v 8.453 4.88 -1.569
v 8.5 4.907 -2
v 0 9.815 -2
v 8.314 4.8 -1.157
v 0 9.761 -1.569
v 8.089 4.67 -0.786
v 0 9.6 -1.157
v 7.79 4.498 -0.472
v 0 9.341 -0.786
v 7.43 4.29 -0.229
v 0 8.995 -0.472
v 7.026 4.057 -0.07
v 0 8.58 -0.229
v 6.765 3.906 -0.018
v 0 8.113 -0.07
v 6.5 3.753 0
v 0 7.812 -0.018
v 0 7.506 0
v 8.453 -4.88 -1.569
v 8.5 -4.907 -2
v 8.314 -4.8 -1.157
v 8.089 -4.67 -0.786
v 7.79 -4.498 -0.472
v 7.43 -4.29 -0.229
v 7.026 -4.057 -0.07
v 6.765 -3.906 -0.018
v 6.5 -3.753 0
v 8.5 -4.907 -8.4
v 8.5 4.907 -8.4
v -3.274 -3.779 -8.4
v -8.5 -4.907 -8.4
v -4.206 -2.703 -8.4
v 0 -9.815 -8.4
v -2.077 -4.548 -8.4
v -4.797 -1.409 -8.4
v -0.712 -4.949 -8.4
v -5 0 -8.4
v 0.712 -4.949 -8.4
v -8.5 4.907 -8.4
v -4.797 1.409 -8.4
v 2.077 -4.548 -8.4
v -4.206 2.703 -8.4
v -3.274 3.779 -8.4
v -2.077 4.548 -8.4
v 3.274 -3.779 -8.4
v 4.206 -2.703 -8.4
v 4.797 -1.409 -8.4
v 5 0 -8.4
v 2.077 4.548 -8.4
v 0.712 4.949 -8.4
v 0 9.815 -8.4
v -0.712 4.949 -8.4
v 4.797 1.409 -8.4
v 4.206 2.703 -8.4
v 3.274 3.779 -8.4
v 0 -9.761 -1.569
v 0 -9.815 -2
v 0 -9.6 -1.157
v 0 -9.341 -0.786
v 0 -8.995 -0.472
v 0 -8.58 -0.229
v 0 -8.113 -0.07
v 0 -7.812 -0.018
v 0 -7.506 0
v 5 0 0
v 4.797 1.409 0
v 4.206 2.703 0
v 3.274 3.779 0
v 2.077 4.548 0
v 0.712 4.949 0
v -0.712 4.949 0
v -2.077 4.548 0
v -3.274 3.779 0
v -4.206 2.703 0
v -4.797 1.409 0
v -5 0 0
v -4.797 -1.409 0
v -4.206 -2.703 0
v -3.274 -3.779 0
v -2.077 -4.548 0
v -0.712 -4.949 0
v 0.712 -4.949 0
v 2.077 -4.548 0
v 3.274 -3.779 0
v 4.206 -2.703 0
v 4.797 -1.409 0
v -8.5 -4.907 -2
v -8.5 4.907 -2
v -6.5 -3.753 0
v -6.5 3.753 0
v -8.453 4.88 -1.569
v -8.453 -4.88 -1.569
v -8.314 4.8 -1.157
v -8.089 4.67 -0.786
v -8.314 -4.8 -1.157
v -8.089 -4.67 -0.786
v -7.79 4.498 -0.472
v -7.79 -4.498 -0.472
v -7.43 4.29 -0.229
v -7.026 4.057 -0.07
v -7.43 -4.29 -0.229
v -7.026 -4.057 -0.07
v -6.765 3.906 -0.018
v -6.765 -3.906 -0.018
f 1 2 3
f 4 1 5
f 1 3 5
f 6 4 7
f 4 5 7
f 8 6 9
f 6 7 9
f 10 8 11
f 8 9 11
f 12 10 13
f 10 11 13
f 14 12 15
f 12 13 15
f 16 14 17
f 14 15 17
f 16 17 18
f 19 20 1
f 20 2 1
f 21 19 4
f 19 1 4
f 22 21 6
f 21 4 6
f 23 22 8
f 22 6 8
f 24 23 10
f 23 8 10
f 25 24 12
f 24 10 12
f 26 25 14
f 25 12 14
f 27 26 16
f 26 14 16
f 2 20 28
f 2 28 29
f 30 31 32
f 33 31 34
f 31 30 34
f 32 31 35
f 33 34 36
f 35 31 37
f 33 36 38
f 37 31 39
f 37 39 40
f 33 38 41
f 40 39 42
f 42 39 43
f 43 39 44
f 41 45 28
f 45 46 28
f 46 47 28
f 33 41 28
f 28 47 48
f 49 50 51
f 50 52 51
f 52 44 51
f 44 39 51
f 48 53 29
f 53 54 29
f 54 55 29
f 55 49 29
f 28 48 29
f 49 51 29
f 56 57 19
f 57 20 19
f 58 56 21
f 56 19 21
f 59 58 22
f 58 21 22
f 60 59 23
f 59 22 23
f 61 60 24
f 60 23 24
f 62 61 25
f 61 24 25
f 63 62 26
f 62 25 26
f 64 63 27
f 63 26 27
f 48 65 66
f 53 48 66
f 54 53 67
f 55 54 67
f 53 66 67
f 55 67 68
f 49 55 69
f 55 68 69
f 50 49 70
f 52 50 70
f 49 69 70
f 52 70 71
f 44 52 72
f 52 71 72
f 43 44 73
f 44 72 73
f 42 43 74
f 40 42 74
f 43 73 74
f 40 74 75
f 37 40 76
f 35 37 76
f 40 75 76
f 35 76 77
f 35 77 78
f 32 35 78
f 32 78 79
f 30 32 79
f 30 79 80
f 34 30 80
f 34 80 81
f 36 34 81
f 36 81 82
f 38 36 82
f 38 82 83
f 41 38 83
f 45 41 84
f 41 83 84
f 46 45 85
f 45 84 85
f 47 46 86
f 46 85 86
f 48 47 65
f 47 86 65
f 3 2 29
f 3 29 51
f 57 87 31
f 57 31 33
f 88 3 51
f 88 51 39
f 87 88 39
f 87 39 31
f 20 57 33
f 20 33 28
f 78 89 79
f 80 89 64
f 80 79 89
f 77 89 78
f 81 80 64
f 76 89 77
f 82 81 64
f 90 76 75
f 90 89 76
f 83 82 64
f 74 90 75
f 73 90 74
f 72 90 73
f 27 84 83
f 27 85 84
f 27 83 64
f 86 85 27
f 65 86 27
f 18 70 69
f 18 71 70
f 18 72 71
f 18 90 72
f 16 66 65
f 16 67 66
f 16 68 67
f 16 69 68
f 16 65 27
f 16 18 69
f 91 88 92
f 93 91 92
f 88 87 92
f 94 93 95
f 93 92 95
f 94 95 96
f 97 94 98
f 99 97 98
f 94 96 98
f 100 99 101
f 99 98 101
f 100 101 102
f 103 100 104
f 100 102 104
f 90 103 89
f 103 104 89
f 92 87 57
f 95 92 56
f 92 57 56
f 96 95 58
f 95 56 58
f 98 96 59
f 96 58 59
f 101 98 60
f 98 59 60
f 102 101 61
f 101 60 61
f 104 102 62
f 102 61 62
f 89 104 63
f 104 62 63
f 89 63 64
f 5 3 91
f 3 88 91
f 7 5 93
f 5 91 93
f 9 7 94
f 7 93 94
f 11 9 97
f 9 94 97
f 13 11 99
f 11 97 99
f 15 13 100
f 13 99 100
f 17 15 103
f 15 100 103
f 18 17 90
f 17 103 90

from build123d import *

# Parameters (mm, degrees)
ESQUISSE1_R        = 5
BOSS_EXTRU_1_DEPTH = 8.4
CONG_2_R           = 2


with BuildPart() as part:
    # Esquisse1 → Boss.-Extru.1 (new body)
    with BuildSketch(Plane.XY):
        Polygon((8.5, 4.907477288), (0, 9.814954576), (-8.5, 4.907477288), (-8.5, -4.907477288), (0, -9.814954576), (8.5, -4.907477288), align=None)
        Circle(ESQUISSE1_R, mode=Mode.SUBTRACT)
    extrude(amount=-BOSS_EXTRU_1_DEPTH)

    # Congé2
    cong_2_edges = [part.edges().sort_by_distance(p)[0] for p in [
        (4.25, -7.361215932, 0),
        (-4.25, -7.361215932, 0),
        (-8.5, 0, 0),
        (-4.25, 7.361215932, 0),
        (4.25, 7.361215932, 0),
        (8.5, 0, 0),
    ]]
    fillet(cong_2_edges, radius=CONG_2_R)


solid = part.part
